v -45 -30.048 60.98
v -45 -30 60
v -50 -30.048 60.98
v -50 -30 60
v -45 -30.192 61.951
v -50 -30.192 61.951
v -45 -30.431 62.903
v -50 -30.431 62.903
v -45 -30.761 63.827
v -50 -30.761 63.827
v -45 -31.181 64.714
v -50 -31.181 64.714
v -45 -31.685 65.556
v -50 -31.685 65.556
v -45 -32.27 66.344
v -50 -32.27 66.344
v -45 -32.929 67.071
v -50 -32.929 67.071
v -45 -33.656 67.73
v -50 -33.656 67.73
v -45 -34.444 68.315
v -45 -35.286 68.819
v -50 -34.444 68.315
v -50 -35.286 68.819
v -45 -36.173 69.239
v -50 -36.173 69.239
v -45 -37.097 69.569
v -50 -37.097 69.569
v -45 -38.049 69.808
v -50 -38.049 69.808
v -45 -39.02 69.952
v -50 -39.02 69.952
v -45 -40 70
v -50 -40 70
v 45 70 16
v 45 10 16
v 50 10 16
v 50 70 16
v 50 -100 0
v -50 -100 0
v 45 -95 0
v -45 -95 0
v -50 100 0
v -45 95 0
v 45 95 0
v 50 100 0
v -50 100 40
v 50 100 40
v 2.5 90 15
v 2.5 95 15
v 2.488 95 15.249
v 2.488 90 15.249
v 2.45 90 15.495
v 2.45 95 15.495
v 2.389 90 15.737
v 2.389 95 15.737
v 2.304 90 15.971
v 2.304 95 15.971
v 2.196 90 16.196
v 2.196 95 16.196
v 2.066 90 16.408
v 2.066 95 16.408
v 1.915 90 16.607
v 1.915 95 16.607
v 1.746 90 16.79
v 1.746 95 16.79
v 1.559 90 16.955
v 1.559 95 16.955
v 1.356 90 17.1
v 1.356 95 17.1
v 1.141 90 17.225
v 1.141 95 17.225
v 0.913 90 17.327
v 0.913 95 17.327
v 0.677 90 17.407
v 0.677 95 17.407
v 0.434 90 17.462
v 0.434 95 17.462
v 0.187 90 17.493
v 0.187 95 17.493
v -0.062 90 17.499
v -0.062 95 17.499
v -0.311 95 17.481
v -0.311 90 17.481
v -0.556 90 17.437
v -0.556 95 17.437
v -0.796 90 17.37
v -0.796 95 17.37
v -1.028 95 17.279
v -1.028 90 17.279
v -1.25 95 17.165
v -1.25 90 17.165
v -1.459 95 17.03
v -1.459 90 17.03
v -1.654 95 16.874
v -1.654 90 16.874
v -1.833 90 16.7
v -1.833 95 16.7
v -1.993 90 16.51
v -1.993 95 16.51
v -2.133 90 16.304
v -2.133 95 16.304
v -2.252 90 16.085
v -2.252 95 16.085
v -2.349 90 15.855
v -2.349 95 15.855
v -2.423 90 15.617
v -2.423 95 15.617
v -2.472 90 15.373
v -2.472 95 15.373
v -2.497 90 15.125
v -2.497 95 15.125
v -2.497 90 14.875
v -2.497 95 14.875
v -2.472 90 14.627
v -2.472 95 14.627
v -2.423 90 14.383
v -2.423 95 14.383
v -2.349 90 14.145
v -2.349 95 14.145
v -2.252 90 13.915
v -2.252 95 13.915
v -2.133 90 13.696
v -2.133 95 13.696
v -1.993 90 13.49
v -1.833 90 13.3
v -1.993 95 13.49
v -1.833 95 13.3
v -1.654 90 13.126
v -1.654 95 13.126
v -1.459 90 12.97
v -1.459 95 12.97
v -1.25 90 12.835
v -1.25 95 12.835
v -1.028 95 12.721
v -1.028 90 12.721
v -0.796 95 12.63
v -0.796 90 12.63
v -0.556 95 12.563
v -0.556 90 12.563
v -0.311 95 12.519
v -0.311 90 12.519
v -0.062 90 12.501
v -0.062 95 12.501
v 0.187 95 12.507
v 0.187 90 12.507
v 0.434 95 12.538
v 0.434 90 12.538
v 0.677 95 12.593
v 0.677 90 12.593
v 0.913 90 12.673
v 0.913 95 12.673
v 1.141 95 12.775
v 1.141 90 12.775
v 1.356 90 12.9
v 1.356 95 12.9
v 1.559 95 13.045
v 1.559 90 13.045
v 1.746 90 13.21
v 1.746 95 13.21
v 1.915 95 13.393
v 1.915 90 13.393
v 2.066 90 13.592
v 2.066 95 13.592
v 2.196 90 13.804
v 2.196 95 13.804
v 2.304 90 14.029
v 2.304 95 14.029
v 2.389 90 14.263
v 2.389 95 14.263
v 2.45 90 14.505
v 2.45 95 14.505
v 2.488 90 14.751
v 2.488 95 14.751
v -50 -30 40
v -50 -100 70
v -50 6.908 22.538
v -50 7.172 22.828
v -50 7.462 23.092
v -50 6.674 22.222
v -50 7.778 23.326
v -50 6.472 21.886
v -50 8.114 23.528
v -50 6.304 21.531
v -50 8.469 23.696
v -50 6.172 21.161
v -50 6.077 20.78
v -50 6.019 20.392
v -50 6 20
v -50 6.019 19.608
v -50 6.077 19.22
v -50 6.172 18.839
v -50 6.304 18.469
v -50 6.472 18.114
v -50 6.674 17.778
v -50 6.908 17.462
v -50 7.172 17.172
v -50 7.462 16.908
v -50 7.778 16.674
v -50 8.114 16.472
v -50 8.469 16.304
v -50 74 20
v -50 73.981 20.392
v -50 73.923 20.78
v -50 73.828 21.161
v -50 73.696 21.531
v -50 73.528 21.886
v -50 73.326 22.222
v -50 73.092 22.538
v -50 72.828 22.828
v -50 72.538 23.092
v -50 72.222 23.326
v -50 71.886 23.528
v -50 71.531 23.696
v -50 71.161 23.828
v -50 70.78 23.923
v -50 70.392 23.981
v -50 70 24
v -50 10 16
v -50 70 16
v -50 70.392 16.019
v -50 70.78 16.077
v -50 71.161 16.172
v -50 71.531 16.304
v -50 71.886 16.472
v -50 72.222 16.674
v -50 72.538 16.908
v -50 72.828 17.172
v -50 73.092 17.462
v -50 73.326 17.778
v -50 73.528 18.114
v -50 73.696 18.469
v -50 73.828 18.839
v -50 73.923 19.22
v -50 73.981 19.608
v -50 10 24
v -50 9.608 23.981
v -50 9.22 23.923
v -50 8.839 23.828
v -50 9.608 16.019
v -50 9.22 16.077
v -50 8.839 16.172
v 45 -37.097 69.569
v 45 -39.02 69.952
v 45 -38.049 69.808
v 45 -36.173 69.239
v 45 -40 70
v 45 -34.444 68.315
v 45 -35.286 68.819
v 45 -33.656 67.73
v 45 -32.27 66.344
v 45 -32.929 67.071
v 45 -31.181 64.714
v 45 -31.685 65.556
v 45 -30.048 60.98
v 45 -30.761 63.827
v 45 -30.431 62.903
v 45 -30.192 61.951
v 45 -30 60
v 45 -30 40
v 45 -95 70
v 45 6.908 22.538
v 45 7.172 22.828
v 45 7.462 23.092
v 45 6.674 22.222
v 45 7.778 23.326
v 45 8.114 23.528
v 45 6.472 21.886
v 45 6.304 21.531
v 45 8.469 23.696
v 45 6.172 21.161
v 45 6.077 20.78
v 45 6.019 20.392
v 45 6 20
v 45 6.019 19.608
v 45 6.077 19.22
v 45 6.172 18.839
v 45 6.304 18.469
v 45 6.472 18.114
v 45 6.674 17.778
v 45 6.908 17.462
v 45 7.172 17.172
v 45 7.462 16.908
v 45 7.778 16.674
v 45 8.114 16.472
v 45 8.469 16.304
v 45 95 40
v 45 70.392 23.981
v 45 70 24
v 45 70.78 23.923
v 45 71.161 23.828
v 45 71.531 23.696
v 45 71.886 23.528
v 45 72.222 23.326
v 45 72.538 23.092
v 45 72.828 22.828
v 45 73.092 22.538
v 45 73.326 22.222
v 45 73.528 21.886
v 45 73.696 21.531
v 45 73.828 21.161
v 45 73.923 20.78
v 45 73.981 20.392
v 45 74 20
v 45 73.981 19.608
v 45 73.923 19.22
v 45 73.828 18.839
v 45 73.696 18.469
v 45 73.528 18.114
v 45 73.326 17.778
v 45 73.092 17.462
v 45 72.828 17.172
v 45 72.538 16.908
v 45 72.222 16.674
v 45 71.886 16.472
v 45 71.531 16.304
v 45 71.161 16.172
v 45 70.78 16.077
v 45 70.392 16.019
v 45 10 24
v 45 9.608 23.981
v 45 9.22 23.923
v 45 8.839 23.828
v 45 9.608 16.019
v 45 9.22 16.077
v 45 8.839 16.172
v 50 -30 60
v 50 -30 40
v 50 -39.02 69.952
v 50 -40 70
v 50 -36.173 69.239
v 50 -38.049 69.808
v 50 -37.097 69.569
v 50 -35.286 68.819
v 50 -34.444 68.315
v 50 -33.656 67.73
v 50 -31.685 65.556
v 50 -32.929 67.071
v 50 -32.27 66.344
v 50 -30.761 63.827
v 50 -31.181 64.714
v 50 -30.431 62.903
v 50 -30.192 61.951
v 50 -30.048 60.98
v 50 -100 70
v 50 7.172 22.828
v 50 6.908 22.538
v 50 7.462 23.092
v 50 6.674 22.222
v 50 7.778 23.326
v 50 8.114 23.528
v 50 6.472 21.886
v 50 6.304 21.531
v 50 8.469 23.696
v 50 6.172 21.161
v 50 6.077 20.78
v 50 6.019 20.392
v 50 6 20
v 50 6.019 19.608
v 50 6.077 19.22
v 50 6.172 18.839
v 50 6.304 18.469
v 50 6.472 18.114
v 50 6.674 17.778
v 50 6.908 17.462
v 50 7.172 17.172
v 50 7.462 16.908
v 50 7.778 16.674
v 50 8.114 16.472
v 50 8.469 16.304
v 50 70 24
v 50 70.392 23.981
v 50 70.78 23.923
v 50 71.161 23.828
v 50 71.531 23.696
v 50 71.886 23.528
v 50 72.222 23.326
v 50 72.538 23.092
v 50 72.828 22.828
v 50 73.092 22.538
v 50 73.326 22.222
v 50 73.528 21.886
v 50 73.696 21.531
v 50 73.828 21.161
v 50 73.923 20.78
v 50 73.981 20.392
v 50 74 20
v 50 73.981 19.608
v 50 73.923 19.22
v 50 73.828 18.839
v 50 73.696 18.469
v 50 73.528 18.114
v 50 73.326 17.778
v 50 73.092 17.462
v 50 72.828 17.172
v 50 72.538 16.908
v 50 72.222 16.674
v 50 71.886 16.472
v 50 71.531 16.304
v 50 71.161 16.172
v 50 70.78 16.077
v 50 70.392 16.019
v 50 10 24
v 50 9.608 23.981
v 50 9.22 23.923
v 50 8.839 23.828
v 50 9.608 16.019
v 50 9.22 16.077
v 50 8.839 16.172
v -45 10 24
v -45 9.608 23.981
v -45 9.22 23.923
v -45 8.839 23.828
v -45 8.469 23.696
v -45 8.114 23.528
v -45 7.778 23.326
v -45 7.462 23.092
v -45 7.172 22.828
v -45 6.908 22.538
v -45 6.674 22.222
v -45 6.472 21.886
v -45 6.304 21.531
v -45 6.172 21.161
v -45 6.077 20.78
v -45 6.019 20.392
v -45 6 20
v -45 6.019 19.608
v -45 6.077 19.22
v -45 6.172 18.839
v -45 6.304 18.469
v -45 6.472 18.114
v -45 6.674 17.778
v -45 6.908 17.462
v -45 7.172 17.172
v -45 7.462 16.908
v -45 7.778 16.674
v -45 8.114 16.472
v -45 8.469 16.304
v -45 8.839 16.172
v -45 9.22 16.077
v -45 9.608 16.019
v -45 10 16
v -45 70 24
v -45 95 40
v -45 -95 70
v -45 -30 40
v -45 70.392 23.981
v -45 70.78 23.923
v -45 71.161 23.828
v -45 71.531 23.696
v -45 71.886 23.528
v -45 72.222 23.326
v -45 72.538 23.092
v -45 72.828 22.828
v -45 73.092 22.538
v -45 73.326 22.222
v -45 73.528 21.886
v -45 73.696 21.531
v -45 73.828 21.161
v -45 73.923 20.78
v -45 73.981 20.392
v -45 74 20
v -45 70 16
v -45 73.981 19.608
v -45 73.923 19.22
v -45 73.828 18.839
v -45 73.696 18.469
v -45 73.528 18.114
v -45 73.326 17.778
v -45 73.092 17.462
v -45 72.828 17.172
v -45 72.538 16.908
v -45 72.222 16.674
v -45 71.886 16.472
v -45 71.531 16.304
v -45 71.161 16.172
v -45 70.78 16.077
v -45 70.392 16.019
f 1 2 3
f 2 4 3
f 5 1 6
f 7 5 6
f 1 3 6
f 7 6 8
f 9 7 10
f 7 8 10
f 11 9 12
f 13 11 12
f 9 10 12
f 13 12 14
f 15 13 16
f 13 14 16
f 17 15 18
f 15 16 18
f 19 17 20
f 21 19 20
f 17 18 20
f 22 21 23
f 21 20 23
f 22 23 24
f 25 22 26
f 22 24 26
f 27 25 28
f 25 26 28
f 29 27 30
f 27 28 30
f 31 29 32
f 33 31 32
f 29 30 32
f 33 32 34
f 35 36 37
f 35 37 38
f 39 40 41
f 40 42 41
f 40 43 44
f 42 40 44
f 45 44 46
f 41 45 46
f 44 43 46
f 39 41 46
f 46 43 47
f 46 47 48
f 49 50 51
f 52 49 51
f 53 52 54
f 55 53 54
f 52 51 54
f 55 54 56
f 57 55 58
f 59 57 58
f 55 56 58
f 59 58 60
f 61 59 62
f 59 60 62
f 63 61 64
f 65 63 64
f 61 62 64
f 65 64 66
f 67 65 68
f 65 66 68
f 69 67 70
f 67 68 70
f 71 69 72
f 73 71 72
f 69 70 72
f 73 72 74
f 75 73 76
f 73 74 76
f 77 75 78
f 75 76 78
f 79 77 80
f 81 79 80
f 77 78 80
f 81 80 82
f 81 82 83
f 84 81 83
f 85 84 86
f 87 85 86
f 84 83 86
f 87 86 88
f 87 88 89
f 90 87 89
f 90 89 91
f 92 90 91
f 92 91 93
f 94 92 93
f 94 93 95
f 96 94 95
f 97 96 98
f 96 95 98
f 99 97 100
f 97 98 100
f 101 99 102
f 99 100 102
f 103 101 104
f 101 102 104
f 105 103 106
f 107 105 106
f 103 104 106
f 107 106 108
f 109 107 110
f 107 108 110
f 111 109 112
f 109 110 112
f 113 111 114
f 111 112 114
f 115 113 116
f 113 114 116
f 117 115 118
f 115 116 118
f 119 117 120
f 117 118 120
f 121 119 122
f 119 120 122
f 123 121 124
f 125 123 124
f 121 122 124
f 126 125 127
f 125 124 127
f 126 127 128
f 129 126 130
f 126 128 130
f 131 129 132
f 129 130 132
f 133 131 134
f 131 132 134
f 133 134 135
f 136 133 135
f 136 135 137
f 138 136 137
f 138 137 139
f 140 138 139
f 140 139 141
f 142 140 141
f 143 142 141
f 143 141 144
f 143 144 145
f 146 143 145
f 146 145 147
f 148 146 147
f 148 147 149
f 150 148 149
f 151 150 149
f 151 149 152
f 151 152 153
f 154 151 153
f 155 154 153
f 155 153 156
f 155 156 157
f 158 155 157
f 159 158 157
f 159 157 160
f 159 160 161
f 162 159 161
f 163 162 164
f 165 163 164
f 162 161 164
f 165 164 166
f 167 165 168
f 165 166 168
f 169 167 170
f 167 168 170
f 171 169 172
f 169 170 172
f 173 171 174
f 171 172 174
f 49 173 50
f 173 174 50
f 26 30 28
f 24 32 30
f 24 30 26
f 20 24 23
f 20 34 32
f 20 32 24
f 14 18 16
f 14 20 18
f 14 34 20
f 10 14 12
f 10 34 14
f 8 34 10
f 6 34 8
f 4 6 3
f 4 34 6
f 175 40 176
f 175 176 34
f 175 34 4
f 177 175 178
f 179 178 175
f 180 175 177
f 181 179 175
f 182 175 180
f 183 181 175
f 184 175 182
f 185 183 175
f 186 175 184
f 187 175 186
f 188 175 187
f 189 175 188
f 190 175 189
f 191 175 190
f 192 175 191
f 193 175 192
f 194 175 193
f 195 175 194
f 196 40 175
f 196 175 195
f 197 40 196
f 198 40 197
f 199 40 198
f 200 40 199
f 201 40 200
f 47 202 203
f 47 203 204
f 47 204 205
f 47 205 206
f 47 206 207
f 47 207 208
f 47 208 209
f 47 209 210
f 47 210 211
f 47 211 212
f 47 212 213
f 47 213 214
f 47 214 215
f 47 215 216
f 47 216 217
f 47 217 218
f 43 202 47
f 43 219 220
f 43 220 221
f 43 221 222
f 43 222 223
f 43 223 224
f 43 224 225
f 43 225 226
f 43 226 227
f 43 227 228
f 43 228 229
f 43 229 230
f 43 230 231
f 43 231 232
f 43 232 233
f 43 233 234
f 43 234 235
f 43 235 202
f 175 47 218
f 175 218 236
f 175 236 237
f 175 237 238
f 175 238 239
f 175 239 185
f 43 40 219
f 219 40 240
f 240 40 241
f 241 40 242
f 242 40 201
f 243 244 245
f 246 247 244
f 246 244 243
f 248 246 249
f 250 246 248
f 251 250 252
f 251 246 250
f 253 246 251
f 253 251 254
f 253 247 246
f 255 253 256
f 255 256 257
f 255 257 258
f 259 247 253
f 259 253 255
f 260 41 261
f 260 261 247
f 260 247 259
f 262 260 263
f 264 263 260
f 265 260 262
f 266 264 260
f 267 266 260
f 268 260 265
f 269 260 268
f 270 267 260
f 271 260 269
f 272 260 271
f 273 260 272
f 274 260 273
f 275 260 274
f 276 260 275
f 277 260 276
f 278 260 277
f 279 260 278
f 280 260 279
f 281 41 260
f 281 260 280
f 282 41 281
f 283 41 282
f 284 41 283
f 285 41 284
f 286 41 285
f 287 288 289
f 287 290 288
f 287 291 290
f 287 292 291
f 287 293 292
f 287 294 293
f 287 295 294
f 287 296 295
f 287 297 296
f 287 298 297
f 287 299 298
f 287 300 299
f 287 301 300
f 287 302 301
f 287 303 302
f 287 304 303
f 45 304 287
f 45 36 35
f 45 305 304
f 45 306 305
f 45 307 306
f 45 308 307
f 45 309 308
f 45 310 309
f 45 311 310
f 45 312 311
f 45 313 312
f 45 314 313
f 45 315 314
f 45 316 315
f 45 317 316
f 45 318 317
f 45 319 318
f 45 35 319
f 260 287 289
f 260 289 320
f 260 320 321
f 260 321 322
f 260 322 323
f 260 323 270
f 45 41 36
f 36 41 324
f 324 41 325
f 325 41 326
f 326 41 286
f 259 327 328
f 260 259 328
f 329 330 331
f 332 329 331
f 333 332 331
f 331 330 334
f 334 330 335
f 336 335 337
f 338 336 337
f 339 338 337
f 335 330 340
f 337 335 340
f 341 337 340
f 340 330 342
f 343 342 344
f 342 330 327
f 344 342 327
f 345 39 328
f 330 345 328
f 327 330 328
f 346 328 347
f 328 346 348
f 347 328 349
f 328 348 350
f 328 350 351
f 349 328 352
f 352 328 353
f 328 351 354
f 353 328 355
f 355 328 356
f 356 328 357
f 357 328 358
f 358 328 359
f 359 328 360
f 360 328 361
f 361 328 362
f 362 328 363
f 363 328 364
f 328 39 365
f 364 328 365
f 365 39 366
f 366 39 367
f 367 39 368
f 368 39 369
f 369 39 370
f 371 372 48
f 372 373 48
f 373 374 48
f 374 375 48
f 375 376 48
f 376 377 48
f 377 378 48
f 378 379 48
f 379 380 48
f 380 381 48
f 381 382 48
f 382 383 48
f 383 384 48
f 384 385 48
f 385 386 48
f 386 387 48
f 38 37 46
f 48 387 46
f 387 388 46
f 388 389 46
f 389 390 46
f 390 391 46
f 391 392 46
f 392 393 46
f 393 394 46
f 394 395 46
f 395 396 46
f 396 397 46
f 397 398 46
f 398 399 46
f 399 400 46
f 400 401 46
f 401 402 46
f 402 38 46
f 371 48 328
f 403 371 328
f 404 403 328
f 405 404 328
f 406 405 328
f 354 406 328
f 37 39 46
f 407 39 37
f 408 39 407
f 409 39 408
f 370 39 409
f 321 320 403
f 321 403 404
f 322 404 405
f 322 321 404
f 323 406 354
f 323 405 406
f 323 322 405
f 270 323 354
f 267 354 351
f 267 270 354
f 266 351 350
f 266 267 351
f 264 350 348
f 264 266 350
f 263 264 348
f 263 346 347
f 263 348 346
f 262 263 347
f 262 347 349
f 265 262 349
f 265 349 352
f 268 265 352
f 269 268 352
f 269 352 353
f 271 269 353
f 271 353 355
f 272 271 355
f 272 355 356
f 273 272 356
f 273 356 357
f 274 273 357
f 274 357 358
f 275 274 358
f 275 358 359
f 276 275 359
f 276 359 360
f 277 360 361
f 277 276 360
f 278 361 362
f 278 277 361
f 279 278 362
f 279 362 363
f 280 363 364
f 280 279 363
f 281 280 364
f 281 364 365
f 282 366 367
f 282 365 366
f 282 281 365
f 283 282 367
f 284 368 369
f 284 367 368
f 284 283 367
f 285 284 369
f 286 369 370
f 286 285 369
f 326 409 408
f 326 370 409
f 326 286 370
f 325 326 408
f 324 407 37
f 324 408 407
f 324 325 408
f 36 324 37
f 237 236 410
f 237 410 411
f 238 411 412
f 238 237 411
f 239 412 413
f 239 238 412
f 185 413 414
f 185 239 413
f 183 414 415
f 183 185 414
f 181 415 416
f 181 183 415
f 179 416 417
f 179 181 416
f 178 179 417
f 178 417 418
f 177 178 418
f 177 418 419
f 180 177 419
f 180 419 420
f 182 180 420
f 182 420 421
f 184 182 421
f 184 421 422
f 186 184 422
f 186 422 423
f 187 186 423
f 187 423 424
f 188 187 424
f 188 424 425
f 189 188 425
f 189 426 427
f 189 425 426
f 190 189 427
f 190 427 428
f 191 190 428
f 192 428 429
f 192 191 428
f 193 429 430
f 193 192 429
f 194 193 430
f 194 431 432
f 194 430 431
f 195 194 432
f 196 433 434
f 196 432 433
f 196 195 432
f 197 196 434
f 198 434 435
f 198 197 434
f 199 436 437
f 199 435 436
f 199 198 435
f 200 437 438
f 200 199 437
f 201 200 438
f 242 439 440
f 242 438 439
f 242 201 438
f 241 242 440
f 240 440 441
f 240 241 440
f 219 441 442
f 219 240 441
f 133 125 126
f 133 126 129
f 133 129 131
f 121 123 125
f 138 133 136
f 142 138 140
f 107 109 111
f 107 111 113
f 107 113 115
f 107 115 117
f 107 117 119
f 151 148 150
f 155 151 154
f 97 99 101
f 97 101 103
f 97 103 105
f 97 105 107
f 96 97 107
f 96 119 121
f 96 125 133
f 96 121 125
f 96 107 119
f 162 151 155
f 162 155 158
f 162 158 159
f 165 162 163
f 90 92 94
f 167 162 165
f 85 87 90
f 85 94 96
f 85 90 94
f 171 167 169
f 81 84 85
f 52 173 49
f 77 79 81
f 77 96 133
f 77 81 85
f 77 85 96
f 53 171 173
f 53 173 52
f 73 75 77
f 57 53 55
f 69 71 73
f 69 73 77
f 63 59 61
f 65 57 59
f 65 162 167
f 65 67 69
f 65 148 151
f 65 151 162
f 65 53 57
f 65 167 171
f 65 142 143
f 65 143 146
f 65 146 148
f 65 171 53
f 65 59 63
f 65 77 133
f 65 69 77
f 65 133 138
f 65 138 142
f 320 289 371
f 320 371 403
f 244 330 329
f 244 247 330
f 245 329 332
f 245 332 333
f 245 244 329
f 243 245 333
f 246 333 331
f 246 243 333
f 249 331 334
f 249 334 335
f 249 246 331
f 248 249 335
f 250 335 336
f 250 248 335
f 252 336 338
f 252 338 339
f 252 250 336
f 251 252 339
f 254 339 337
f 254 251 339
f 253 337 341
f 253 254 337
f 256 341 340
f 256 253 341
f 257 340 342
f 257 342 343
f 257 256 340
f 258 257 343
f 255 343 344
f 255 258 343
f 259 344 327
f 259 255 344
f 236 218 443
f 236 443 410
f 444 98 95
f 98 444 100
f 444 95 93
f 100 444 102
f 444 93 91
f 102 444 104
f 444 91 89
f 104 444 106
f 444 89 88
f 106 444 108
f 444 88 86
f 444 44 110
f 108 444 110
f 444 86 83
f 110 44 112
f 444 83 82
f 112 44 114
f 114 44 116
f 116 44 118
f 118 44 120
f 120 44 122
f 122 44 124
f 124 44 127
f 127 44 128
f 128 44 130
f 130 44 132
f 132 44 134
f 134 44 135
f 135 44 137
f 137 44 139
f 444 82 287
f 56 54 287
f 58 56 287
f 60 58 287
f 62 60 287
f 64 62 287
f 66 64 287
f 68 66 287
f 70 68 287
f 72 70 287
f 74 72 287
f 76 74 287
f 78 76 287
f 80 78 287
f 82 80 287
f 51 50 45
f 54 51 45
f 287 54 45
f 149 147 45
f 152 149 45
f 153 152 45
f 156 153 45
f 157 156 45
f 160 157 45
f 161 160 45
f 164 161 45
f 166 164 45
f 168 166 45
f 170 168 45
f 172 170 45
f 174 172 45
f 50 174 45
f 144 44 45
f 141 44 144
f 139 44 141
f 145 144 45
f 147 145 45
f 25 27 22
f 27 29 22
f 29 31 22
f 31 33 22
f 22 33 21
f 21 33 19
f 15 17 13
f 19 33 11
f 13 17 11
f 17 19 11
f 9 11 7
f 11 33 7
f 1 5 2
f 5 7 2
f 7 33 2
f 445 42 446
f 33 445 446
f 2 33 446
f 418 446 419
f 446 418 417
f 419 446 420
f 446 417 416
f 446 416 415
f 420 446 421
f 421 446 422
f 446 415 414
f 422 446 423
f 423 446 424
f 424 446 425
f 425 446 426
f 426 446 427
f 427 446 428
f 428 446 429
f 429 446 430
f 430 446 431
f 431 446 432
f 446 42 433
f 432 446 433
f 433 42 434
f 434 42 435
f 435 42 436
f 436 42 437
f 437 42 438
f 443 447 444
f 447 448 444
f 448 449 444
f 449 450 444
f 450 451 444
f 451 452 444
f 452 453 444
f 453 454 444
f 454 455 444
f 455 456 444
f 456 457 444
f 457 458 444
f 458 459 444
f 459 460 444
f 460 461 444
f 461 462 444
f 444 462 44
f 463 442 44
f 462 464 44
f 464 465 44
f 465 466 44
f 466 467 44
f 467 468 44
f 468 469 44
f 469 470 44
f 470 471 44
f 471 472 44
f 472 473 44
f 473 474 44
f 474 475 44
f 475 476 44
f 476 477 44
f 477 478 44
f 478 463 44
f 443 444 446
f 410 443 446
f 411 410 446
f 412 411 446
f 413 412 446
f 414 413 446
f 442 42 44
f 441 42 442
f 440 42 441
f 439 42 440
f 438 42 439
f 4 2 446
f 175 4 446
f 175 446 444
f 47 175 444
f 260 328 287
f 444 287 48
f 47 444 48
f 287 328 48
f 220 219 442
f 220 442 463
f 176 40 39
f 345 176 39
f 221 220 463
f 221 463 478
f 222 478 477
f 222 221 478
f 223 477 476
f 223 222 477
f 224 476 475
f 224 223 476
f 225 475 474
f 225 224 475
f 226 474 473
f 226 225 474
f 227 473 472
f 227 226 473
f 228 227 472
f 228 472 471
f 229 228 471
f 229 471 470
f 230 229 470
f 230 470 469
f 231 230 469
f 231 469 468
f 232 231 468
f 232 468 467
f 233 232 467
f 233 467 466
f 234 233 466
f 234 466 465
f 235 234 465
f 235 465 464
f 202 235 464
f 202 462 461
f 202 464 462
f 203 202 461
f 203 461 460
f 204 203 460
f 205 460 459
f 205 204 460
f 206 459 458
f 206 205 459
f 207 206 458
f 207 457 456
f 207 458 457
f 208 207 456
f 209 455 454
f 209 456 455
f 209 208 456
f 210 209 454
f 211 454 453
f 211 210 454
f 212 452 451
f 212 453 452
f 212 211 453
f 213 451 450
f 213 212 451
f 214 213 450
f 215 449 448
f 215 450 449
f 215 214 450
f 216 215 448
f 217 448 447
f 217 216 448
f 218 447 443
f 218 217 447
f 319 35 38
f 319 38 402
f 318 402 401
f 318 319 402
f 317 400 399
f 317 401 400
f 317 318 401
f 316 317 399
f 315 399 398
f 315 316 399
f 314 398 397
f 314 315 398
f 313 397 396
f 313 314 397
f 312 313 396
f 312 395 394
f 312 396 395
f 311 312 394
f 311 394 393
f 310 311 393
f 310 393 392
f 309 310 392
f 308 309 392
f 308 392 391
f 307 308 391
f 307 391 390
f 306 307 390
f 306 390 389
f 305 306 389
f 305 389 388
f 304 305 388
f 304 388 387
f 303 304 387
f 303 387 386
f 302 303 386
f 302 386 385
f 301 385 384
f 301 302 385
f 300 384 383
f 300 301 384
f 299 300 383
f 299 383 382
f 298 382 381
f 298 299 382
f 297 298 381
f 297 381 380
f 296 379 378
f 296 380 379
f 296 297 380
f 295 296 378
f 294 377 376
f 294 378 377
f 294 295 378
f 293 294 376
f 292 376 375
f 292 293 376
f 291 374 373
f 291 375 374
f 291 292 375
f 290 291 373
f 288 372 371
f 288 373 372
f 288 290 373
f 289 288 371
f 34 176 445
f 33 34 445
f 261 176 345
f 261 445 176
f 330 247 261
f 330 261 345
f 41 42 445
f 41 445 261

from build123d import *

# Parameters (mm, degrees)
SKETCH1_W               = 100
SKETCH1_H               = 200
SKETCH1_W_2             = 90
SKETCH1_H_2             = 190
BOSS_EXTRUDE1_DEPTH     = 70
SKETCH2_W               = 30
SKETCH2_H               = 130
CUT_EXTRUDE1_DEPTH      = 1
CUT_EXTRUDE1_DEPTH_BACK = 101
FILLET1_R               = 10
SKETCH3_R               = 2.5
BOSS_EXTRUDE2_DEPTH     = 5
CUT_EXTRUDE2_DEPTH      = 1
CUT_EXTRUDE2_DEPTH_BACK = 101


with BuildPart() as part:
    # Sketch1 → Boss-Extrude1 (new body)
    with BuildSketch(Plane.XY):
        Rectangle(SKETCH1_W, SKETCH1_H)
        Rectangle(SKETCH1_W_2, SKETCH1_H_2, mode=Mode.SUBTRACT)
    extrude(amount=BOSS_EXTRUDE1_DEPTH)

    # Sketch2 → Cut-Extrude1 (cut, two sides)
    with BuildSketch(Plane(origin=(50, 0, 0), x_dir=(0, 0, -1), z_dir=(1, 0, 0))) as cut_extrude1_sk:
        with Locations((-55, 35)):
            Rectangle(SKETCH2_W, SKETCH2_H)
    extrude(amount=CUT_EXTRUDE1_DEPTH, mode=Mode.SUBTRACT)
    extrude(cut_extrude1_sk.sketch, amount=-CUT_EXTRUDE1_DEPTH_BACK, mode=Mode.SUBTRACT)

    # Fillet1
    fillet1_edges = [part.edges().sort_by_distance(p)[0] for p in [
        (47.5, -30, 70),
        (-47.5, -30, 70),
    ]]
    fillet(fillet1_edges, radius=FILLET1_R)

    # Sketch3 → Boss-Extrude2 (add)
    with BuildSketch(Plane.XZ.offset(-95)):
        with Locations((0, 15)):
            Circle(SKETCH3_R)
    extrude(amount=BOSS_EXTRUDE2_DEPTH)

    # Sketch4 → Cut-Extrude2 (cut, two sides)
    with BuildSketch(Plane.ZY.offset(50)) as cut_extrude2_sk:
        with BuildLine():
            Line((16, 10), (16, 70))
            ThreePointArc((16, 70), (20, 74), (24, 70))
            Line((24, 70), (24, 10))
            ThreePointArc((24, 10), (20, 6), (16, 10))
        make_face()
    extrude(amount=CUT_EXTRUDE2_DEPTH, mode=Mode.SUBTRACT)
    extrude(cut_extrude2_sk.sketch, amount=-CUT_EXTRUDE2_DEPTH_BACK, mode=Mode.SUBTRACT)


solid = part.part
